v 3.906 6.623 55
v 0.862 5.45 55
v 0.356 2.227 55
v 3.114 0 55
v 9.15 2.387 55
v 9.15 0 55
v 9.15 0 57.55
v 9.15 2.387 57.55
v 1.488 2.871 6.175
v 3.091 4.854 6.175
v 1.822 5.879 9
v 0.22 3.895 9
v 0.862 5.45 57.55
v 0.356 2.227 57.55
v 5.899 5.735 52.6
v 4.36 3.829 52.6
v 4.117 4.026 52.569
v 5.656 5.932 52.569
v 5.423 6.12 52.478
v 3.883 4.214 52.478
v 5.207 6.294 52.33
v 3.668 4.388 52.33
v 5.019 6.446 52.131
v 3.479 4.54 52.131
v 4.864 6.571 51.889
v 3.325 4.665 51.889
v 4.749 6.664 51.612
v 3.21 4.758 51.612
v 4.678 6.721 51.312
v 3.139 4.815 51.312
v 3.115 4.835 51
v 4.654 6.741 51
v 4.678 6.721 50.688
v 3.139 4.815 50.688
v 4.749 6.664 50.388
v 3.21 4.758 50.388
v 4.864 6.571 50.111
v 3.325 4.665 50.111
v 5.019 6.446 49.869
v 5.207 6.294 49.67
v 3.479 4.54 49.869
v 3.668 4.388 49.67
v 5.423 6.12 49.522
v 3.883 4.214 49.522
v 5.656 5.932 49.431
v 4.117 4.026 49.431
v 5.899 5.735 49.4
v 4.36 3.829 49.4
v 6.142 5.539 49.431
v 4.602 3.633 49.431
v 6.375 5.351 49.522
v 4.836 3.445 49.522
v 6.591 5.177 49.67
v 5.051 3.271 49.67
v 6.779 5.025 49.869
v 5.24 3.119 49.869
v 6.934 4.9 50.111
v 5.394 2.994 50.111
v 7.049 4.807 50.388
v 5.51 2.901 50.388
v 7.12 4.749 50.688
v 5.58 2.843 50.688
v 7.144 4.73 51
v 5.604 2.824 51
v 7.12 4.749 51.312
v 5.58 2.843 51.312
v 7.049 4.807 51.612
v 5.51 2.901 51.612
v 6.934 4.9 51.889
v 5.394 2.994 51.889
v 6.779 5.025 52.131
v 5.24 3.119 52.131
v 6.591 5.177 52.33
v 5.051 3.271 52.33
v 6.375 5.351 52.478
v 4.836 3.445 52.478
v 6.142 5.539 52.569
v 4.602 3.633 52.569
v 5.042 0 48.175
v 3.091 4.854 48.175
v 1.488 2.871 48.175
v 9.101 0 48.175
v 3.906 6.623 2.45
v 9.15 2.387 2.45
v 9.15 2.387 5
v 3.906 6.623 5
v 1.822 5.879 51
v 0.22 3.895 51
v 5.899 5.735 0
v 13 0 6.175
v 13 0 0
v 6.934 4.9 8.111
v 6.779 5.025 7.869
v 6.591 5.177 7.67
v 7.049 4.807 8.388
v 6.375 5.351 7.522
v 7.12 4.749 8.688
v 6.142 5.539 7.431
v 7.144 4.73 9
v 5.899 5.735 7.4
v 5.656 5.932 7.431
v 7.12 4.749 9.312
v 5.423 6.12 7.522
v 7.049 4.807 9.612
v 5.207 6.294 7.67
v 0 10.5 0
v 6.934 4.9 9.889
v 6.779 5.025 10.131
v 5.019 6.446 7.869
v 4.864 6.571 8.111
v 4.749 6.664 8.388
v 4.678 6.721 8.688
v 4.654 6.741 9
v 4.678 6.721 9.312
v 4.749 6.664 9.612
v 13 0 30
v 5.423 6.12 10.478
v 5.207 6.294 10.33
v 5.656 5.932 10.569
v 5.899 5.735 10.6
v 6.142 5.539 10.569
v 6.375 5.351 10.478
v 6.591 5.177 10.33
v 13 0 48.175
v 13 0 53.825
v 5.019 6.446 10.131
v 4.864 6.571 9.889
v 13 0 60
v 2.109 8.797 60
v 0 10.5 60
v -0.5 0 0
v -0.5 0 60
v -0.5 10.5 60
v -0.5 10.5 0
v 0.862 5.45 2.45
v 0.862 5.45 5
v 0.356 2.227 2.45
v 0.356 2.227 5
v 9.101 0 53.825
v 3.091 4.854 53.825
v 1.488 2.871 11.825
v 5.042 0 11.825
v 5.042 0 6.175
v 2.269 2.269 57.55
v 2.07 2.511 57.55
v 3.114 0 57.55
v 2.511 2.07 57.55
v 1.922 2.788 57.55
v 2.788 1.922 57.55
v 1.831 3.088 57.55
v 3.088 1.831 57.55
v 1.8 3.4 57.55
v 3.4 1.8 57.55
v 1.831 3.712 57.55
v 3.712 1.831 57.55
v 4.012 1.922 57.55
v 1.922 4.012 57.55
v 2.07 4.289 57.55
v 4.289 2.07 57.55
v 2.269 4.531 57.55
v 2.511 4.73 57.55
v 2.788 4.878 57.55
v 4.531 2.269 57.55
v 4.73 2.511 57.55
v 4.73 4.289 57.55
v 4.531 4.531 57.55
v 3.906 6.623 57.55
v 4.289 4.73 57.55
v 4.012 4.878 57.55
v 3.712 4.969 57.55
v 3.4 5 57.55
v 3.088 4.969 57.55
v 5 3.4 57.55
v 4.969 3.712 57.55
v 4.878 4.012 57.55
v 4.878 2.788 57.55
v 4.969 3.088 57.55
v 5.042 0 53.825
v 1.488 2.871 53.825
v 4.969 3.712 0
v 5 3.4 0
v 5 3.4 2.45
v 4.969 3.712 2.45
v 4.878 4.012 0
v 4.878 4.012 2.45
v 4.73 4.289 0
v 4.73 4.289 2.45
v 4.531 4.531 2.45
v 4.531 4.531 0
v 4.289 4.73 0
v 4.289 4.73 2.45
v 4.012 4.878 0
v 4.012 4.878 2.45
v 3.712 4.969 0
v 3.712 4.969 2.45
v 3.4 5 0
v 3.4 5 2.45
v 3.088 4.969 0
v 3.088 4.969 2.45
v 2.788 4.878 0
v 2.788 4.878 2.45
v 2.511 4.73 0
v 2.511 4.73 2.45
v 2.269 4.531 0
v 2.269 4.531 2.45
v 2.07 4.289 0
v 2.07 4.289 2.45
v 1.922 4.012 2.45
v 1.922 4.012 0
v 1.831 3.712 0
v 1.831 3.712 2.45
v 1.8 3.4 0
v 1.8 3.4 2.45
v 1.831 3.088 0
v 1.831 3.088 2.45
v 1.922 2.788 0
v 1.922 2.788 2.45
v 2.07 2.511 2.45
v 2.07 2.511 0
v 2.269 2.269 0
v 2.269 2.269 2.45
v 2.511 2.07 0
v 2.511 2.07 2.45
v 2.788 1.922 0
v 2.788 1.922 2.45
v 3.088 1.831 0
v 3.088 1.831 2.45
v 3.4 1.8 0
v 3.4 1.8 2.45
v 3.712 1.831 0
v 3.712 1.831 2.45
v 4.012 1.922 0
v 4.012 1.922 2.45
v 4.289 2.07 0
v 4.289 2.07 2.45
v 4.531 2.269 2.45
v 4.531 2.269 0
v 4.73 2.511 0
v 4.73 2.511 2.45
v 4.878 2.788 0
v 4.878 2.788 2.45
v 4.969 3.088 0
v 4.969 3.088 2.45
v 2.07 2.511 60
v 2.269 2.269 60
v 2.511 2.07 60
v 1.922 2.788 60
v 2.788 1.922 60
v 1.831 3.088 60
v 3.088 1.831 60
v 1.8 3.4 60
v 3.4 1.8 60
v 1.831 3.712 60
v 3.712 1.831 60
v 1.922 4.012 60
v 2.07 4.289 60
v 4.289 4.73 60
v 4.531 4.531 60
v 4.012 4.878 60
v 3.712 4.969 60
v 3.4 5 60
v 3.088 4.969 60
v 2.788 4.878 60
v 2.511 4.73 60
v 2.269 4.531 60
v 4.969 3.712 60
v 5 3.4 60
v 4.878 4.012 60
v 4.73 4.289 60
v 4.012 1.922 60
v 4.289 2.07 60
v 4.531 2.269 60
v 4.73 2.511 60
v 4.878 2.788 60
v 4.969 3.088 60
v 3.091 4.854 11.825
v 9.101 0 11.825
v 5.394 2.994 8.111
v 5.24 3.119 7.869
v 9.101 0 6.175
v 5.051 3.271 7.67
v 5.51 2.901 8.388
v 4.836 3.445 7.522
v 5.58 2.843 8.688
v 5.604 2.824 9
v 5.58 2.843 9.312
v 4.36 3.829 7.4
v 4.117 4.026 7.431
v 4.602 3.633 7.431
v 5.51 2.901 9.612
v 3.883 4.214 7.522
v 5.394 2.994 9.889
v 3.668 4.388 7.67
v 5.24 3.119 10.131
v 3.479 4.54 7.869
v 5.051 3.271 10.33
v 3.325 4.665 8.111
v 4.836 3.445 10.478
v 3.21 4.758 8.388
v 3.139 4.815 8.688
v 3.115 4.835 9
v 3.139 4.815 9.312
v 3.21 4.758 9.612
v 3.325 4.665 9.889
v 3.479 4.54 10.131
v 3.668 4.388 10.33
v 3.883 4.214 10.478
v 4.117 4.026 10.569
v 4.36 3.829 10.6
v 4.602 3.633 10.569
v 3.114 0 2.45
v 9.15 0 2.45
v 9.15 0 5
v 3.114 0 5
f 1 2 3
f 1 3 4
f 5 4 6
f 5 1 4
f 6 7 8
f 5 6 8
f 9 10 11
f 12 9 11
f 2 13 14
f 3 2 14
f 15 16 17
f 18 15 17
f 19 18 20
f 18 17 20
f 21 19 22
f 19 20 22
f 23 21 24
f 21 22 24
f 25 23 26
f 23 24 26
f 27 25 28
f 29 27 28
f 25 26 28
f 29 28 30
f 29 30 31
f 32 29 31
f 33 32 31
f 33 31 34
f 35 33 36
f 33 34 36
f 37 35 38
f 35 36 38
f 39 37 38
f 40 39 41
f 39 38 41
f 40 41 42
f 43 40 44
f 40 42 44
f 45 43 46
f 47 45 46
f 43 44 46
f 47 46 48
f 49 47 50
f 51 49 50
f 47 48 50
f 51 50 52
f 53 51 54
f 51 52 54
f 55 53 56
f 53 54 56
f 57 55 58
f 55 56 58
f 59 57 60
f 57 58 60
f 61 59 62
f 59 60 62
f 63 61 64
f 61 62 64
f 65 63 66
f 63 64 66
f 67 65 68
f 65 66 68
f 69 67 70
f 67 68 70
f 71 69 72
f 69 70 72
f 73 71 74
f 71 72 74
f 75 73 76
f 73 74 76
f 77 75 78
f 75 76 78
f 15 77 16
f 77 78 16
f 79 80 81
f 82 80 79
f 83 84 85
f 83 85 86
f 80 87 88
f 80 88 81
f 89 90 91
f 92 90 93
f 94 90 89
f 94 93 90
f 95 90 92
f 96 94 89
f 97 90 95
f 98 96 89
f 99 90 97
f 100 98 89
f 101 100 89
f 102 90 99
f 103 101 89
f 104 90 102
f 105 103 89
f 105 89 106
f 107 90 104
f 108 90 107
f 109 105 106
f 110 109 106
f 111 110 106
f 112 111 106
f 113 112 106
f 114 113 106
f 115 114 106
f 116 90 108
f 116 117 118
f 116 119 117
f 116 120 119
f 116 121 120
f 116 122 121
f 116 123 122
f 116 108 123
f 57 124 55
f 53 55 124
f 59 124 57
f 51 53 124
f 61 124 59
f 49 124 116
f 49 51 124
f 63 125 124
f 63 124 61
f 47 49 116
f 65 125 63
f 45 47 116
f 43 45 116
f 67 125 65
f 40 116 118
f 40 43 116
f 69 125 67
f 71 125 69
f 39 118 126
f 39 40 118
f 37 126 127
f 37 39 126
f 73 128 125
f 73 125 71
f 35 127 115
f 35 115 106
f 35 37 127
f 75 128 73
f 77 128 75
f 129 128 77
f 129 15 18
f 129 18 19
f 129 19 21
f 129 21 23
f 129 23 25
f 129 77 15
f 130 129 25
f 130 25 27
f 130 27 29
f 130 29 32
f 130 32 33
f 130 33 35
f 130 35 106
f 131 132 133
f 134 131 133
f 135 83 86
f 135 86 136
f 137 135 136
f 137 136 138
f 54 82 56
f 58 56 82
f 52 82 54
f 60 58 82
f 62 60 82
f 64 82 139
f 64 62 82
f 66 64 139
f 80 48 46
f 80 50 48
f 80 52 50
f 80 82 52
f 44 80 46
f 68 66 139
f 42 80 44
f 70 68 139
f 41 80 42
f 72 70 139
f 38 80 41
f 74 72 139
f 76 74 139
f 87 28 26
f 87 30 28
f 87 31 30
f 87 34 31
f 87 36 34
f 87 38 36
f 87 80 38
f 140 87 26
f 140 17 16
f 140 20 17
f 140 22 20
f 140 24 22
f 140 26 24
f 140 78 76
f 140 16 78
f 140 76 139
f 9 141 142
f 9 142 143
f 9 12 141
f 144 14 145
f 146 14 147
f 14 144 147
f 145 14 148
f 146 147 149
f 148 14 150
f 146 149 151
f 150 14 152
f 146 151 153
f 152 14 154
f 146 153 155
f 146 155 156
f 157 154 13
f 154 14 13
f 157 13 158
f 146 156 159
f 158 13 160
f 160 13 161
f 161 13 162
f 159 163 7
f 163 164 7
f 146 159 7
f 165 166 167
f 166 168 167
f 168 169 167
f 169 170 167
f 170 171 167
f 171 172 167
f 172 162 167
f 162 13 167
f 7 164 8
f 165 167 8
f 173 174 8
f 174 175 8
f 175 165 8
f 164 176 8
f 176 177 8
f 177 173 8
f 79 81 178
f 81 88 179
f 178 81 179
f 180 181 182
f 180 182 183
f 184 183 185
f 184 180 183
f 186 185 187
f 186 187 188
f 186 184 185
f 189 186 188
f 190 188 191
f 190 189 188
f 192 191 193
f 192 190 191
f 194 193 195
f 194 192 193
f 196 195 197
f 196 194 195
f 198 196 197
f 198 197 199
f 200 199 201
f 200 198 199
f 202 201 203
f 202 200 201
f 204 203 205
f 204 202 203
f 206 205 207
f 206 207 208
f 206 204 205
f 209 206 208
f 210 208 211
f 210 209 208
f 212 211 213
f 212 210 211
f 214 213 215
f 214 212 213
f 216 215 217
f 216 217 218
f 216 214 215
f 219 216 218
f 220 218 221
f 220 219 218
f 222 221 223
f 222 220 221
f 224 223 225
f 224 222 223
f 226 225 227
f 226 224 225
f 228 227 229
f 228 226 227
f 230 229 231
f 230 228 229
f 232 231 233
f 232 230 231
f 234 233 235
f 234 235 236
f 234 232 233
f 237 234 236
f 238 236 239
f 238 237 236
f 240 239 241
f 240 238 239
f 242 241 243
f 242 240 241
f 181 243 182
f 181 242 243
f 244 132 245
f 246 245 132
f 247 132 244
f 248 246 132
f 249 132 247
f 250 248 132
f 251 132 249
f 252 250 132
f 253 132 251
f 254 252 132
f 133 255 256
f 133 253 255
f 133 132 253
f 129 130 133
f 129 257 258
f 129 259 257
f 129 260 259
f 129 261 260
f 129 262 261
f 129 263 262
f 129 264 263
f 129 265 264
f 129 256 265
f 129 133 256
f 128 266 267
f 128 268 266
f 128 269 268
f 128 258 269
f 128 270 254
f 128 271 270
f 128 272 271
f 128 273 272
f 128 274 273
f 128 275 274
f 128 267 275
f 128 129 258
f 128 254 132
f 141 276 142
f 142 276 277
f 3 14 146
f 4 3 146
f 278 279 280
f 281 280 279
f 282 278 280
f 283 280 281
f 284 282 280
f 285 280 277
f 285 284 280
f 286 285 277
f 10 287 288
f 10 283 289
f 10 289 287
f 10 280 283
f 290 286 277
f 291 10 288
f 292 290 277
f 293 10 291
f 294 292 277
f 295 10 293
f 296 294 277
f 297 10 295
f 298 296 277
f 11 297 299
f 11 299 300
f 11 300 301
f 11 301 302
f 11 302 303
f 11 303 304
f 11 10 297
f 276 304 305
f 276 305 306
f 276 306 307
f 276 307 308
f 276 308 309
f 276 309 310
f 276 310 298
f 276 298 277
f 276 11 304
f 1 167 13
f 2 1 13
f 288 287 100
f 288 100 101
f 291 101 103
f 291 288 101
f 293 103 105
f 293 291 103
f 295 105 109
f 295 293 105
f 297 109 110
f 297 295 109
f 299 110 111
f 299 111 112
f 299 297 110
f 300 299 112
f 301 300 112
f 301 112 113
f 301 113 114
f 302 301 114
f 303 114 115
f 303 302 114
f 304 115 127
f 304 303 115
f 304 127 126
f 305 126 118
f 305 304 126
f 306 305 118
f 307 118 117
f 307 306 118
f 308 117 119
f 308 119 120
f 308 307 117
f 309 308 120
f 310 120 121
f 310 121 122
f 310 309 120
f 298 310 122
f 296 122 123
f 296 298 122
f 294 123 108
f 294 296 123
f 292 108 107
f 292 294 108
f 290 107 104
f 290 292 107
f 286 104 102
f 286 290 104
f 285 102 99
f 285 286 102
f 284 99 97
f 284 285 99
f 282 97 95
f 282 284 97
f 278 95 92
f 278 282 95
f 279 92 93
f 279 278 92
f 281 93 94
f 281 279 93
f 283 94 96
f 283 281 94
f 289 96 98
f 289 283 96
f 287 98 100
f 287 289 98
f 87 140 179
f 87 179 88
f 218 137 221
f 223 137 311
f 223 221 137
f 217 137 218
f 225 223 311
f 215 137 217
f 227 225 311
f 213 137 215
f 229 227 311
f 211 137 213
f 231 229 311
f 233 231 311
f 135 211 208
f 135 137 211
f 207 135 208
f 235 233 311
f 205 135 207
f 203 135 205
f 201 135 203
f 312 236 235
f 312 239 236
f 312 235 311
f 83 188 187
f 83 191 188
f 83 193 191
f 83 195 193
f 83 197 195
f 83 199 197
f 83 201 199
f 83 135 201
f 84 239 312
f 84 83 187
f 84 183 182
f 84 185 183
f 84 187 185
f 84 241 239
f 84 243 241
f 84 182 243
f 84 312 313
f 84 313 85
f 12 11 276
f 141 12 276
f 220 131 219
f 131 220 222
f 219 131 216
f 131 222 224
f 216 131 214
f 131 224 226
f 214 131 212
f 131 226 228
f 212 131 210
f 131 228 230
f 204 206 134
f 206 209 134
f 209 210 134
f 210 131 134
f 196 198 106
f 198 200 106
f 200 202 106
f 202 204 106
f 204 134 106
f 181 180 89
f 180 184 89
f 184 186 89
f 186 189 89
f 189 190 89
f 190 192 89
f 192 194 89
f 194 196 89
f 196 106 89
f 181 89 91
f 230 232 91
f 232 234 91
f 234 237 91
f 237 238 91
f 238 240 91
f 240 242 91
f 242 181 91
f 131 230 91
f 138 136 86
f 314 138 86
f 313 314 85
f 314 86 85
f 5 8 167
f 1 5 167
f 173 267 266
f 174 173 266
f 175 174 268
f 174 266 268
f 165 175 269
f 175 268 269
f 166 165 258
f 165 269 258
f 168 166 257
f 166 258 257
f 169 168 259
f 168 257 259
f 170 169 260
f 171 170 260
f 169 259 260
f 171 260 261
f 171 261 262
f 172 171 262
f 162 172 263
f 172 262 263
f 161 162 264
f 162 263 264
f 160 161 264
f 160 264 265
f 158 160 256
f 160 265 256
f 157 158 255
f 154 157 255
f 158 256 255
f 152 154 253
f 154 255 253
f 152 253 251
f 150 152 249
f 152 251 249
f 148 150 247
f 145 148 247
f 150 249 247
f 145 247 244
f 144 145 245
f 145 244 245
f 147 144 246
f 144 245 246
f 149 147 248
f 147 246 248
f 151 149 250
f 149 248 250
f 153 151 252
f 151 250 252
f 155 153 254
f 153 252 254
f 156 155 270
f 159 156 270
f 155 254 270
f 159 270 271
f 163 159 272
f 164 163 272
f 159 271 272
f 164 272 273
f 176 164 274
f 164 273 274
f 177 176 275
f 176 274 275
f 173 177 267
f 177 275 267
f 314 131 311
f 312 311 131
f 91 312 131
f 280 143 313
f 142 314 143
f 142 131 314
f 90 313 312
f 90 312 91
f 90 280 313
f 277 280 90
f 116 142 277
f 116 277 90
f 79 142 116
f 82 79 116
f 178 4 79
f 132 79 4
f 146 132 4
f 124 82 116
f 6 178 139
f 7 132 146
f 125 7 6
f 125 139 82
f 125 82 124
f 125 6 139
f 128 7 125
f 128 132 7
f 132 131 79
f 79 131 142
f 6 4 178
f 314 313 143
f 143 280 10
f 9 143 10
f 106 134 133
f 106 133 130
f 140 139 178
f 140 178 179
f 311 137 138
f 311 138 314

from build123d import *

# Parameters (mm, degrees)
BOSS_EXTRUDE1_DEPTH     = 30
SKETCH1_13_W            = 0.5
SKETCH1_13_H            = 10.5
BOSS_EXTRUDE6_DEPTH     = 30
CUT_EXTRUDE3_DEPTH      = 5
BOSS_EXTRUDE4_START     = -2.45
BOSS_EXTRUDE4_OUTLINE_R = 1.6
BOSS_EXTRUDE4_DEPTH     = 2.45
CUT_EXTRUDE1_DEPTH      = 5
SKETCH1_10_R            = 1.6
BOSS_EXTRUDE5_DEPTH     = 2.45
CUT_EXTRUDE4_DEPTH      = 63.283625457


# Read off the part's stored shape, not the designer's step: Boss-Extrude4
with BuildPart() as part:
    # Sketch1 → Boss-Extrude1 (new body)
    with BuildSketch(Plane.XY):
        Polygon((13, 0), (0, 10.5), (0, 0), align=None)
    boss_extrude1 = extrude(amount=BOSS_EXTRUDE1_DEPTH)

    # Sketch1<13> → Boss-Extrude6 (add)
    with BuildSketch(Plane.XY):
        with Locations((-0.25, 5.25)):
            Rectangle(SKETCH1_13_W, SKETCH1_13_H)
    boss_extrude6 = extrude(amount=BOSS_EXTRUDE6_DEPTH)

    # Sketch4 → Cut-Extrude3 (cut)
    with BuildSketch(Plane(origin=(5.132497762, 6.354521038, 0), x_dir=(0, 0, -1), z_dir=(0.6283371070876215, 0.7779411802037215, 0))):
        Polygon((-11.825, -10.113235343), (-6.175, -10.113235343), (-6.175, 0.645733136), (-9, 2.276747647), (-11.825, 0.645733136), align=None)
    cut_extrude3 = extrude(amount=-CUT_EXTRUDE3_DEPTH, mode=Mode.SUBTRACT)

    # Boss-Extrude4 outline → Boss-Extrude4 (add)
    with BuildSketch(Plane(origin=(5.132497762, 6.354521038, 0), x_dir=(0, 0, -1), z_dir=(0.6283371070876215, 0.7779411802037215, 0)).offset(BOSS_EXTRUDE4_START)):
        Polygon((-6.175, -0.985281374), (0, -0.985281374), (0, 3.886764657), (-30, 3.886764657), (-30, -10.113235343), (0, -10.113235343), (0, -8.485281374), (-6.175, -8.485281374), align=None)
        with Locations((-9, -0.985281374)):
            Circle(BOSS_EXTRUDE4_OUTLINE_R, mode=Mode.SUBTRACT)
    boss_extrude4 = extrude(amount=BOSS_EXTRUDE4_DEPTH)

    # Sketch1<4> → Cut-Extrude1 (cut)
    with BuildSketch(Plane.XY):
        Polygon((9.15, 0), (9.15, 2.387149176), (3.906218974, 6.622510773), (0.862333294, 5.449653878), (0.356114319, 2.227143105), (3.113529592, 0), align=None)
    cut_extrude1 = extrude(amount=CUT_EXTRUDE1_DEPTH, mode=Mode.SUBTRACT)

    # Sketch1<10> → Boss-Extrude5 (add)
    with BuildSketch(Plane.XY):
        Polygon((3.113529592, 0), (9.15, 0), (9.15, 2.387149176), (3.906218974, 6.622510773), (0.862333294, 5.449653878), (0.356114319, 2.227143105), align=None)
        with Locations((3.4, 3.4)):
            Circle(SKETCH1_10_R, mode=Mode.SUBTRACT)
    boss_extrude5 = extrude(amount=BOSS_EXTRUDE5_DEPTH)

    # Mirror1: Boss-Extrude1, Boss-Extrude6, Cut-Extrude3, Boss-Extrude4, Cut-Extrude1, Boss-Extrude5 across plane
    add(boss_extrude1.mirror(Plane.XY.offset(30)))
    add(boss_extrude6.mirror(Plane.XY.offset(30)))
    add(cut_extrude3.mirror(Plane.XY.offset(30)), mode=Mode.SUBTRACT)
    add(boss_extrude4.mirror(Plane.XY.offset(30)))
    add(cut_extrude1.mirror(Plane.XY.offset(30)), mode=Mode.SUBTRACT)
    add(boss_extrude5.mirror(Plane.XY.offset(30)))

    # Sketch1<12> → Cut-Extrude4 (cut, through all)
    with BuildSketch(Plane.XY):
        Polygon((13, -3.5), (13, 0), (12.105518027, 0), (9.15, 0), (3.4, 0), (3.113529592, 0), (0, 0), (0, -3.5), align=None)
    extrude(amount=CUT_EXTRUDE4_DEPTH, mode=Mode.SUBTRACT)


solid = part.part
